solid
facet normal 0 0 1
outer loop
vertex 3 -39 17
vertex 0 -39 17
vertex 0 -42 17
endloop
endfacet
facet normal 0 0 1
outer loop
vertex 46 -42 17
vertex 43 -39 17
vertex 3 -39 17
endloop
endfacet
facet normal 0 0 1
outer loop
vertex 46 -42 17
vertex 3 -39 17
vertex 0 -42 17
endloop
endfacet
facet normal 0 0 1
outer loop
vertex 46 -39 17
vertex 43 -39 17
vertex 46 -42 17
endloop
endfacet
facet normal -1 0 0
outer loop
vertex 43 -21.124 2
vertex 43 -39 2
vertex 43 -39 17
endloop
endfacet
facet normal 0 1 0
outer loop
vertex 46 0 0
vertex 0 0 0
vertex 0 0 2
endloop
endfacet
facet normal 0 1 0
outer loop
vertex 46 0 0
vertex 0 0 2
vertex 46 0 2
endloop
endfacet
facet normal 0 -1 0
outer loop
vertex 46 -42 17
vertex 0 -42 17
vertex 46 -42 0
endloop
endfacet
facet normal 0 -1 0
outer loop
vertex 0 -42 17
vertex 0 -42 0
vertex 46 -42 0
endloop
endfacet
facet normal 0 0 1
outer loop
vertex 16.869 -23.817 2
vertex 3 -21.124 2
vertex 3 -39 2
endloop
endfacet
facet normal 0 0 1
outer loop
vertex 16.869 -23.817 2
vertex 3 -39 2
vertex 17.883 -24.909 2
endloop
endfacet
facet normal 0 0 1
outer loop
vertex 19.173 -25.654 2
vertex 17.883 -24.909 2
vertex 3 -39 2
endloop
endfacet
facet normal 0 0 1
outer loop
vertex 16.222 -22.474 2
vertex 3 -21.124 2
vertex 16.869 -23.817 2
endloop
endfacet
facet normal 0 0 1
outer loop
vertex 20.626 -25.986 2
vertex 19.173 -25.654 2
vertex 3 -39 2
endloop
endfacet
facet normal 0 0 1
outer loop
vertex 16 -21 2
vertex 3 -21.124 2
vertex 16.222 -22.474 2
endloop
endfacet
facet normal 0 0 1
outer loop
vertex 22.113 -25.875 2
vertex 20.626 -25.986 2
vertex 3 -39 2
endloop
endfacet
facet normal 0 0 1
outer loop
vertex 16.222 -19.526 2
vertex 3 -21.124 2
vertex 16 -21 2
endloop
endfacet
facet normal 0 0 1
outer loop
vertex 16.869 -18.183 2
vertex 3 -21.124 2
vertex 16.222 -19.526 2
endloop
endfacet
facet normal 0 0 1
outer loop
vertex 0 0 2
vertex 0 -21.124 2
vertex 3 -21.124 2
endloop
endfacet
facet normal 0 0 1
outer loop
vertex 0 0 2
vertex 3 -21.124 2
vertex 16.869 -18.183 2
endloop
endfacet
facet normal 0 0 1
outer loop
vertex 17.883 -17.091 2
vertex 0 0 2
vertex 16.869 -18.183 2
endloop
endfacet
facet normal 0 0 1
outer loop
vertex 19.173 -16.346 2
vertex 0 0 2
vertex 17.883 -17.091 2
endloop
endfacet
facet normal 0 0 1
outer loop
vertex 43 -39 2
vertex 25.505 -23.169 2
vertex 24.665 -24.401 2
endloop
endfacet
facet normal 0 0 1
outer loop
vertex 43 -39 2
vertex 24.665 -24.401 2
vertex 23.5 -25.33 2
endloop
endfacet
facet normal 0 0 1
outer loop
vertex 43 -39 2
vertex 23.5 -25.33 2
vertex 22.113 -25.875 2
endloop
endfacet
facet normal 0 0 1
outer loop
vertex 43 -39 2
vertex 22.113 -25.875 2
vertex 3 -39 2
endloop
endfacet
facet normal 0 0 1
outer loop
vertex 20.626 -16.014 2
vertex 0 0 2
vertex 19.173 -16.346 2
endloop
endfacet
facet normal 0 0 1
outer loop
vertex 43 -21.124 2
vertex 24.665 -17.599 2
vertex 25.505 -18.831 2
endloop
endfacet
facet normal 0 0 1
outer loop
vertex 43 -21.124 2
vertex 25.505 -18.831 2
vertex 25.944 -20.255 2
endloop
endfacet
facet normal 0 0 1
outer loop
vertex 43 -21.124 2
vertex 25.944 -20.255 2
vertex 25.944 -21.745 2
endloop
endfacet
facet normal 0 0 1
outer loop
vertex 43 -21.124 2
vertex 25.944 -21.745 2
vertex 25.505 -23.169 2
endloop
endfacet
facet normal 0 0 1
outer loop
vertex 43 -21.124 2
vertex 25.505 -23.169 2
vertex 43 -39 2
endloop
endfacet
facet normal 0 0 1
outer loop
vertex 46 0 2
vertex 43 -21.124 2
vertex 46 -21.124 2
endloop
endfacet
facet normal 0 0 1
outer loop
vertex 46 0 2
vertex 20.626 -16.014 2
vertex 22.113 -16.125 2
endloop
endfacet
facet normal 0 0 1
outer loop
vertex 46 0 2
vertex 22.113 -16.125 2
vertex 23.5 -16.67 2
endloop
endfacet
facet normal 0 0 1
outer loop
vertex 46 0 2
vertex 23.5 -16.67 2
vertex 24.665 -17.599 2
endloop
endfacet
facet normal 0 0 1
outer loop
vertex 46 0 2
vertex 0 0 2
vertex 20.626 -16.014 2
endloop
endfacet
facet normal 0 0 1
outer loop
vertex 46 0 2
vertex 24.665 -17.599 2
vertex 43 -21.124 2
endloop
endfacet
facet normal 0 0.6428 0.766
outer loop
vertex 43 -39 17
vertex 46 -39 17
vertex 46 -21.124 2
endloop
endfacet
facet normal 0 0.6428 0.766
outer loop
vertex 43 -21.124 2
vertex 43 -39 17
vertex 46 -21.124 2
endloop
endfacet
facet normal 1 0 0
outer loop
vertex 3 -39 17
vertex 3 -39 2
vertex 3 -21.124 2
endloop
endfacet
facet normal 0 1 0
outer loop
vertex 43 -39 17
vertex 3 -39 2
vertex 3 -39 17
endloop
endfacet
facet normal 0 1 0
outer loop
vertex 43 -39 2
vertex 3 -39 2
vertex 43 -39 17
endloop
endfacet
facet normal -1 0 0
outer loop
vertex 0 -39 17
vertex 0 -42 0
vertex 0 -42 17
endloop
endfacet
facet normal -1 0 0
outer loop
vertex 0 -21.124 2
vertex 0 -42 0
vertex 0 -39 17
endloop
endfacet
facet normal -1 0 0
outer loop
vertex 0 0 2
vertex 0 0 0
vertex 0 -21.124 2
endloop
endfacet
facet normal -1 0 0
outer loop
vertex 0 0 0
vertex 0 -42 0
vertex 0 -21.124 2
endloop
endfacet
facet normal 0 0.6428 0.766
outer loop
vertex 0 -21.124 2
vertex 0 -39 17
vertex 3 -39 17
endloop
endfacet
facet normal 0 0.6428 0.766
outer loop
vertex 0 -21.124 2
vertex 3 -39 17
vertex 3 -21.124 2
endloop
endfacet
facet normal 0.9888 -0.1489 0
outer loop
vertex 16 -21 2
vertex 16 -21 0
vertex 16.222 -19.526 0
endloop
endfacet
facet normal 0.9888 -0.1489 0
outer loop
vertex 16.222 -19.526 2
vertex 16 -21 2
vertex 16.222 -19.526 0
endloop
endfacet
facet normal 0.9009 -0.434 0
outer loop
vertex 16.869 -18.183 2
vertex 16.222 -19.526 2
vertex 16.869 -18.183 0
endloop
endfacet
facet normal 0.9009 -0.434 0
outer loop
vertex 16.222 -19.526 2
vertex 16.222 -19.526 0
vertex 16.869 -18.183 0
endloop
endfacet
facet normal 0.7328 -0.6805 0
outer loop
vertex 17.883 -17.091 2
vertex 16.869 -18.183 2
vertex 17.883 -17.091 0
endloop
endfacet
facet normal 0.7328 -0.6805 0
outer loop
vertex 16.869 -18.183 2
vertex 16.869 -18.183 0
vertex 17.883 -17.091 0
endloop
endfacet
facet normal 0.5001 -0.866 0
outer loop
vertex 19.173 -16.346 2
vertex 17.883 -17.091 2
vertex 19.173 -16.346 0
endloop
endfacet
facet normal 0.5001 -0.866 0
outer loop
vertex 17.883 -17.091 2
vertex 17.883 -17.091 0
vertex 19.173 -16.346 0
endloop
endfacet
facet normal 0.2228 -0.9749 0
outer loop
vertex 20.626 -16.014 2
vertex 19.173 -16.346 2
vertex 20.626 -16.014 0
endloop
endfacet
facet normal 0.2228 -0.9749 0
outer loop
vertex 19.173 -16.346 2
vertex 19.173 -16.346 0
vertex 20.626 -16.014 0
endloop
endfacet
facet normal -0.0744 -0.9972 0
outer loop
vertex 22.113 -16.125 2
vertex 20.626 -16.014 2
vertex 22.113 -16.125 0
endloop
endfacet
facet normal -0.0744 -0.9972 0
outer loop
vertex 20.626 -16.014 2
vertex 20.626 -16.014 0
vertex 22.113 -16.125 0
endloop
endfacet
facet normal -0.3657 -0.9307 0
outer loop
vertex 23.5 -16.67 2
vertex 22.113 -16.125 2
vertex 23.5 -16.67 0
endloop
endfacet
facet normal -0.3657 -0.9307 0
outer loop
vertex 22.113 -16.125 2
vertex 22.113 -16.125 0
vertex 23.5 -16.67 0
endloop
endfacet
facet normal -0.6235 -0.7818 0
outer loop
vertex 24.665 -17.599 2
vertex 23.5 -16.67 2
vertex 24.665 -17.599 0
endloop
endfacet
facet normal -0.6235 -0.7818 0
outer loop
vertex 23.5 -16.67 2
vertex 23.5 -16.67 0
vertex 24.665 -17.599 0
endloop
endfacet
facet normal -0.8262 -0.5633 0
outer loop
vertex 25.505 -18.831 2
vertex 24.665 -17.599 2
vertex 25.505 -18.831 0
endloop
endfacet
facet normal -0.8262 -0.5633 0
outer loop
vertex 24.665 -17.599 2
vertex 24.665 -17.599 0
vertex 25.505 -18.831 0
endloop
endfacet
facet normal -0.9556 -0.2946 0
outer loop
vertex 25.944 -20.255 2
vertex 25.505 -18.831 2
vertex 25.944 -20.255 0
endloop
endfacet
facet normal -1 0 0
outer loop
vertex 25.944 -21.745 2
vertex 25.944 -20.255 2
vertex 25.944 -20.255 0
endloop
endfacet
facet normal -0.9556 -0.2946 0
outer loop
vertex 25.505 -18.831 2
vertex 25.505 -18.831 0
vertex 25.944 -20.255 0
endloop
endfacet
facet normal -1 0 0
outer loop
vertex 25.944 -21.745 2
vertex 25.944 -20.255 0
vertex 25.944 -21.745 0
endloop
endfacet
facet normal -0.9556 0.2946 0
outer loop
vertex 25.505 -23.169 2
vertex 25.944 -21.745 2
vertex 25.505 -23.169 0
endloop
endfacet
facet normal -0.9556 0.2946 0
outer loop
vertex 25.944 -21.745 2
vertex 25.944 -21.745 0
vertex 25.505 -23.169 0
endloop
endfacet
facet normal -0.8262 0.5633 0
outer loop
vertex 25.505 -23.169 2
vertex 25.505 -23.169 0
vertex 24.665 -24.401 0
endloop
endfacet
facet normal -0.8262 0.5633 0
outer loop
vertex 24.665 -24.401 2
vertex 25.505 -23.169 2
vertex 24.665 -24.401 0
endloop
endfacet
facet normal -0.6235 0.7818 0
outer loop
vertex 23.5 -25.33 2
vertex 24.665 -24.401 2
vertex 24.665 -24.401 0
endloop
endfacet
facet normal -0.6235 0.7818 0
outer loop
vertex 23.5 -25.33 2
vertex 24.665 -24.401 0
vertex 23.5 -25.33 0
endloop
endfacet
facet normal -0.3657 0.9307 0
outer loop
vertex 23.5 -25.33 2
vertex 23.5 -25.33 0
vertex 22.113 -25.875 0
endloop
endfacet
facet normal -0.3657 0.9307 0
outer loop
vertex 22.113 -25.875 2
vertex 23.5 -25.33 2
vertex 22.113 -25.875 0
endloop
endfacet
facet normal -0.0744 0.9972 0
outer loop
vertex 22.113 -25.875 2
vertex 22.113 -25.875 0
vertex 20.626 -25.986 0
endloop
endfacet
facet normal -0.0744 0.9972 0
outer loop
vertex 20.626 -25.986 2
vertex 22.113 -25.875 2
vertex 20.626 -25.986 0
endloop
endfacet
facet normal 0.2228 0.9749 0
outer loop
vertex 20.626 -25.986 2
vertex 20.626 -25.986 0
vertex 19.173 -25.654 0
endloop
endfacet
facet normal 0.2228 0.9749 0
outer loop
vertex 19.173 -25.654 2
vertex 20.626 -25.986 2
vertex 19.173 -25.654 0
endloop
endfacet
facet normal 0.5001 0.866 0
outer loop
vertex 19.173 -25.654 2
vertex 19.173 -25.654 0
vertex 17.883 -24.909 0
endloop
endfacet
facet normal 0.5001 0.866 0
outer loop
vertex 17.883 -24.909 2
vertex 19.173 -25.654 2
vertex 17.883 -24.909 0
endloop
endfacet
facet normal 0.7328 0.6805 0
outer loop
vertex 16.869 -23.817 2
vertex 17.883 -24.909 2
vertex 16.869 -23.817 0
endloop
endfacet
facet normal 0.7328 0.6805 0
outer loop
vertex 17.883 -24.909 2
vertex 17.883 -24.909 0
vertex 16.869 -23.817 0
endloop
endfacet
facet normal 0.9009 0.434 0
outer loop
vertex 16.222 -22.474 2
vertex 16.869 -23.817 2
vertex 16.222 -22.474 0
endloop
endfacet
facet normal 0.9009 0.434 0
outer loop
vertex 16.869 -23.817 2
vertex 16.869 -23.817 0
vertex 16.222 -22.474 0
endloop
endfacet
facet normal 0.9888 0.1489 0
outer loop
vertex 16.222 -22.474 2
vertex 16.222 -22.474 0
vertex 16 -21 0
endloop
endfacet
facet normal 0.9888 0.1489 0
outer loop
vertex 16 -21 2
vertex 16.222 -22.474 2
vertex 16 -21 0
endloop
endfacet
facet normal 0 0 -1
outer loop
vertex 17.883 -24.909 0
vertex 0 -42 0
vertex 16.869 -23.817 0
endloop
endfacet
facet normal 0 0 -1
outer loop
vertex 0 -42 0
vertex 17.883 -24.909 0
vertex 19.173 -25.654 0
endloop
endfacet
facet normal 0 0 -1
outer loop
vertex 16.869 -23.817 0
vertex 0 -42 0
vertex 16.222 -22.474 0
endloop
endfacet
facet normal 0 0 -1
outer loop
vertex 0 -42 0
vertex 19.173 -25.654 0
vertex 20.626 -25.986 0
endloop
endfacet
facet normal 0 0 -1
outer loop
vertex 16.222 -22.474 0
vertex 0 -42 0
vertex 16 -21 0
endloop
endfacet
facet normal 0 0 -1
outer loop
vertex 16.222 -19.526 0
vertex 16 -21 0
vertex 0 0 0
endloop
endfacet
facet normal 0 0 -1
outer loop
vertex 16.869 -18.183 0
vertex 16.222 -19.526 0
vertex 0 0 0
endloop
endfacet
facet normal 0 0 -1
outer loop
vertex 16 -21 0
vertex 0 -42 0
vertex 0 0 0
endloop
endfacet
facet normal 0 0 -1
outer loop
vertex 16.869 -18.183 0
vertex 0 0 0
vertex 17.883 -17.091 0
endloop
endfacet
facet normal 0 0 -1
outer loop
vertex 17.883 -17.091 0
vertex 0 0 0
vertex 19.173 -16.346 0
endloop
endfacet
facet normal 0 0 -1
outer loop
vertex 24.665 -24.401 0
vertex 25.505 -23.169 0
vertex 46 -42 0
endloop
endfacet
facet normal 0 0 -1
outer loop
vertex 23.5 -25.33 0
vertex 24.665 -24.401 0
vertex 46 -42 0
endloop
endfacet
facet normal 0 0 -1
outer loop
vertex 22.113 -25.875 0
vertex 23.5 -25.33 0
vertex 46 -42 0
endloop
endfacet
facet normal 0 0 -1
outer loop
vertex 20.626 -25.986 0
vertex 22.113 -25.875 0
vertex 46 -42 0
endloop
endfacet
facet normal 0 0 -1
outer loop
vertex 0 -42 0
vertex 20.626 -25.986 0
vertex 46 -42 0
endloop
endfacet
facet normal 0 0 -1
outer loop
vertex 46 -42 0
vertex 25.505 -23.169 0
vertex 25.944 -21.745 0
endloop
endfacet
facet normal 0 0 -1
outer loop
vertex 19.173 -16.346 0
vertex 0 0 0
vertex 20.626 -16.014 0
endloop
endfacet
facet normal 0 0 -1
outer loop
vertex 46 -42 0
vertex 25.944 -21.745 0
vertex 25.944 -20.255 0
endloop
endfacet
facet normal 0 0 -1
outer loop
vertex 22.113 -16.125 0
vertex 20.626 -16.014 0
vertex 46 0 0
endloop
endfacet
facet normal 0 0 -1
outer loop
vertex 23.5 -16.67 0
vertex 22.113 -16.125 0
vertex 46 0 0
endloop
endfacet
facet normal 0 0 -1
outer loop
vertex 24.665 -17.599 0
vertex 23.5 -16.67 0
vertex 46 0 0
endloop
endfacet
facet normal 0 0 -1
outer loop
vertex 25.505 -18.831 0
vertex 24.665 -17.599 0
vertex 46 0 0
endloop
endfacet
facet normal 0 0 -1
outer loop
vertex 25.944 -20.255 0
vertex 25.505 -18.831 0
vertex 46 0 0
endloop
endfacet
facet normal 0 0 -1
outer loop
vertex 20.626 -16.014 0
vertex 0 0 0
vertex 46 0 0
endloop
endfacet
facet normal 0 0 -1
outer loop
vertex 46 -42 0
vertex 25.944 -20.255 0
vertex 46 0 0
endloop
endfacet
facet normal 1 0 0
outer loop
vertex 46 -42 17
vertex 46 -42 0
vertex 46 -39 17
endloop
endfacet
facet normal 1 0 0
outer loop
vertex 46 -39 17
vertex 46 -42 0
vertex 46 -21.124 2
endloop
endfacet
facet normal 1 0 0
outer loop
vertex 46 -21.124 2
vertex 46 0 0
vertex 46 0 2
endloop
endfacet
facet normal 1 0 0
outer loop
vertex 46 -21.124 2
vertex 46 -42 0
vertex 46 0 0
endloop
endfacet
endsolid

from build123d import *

# Parameters (mm, degrees)
SKETCH1_W           = 46
SKETCH1_H           = 42
BOSS_EXTRUDE1_DEPTH = 2
SKETCH2_W           = 46
SKETCH2_H           = 3
BOSS_EXTRUDE2_DEPTH = 15
SKETCH4_R           = 5
CUT_EXTRUDE2_DEPTH  = 2
BOSS_EXTRUDE3_DEPTH = 3
BOSS_EXTRUDE4_DEPTH = 3


with BuildPart() as part:
    # Sketch1 → Boss-Extrude1 (new body)
    with BuildSketch(Plane.XY):
        with Locations((23, -21)):
            Rectangle(SKETCH1_W, SKETCH1_H)
    extrude(amount=BOSS_EXTRUDE1_DEPTH)

    # Sketch2 → Boss-Extrude2 (add)
    with BuildSketch(Plane.XY.offset(2)):
        with Locations((23, -40.5)):
            Rectangle(SKETCH2_W, SKETCH2_H)
    extrude(amount=BOSS_EXTRUDE2_DEPTH)

    # Sketch4 → Cut-Extrude2 (cut)
    with BuildSketch(Plane(origin=(0, 0, 0), x_dir=(-1, 0, 0), z_dir=(0, 0, -1))):
        with Locations((-21, -21)):
            Circle(SKETCH4_R)
    extrude(amount=-CUT_EXTRUDE2_DEPTH, mode=Mode.SUBTRACT)

    # Sketch5 → Boss-Extrude3 (add)
    with BuildSketch(Plane.ZY):
        Polygon((17, -39), (2, -21.123696111), (2, -39), align=None)
    extrude(amount=-BOSS_EXTRUDE3_DEPTH)

    # Sketch6 → Boss-Extrude4 (add)
    with BuildSketch(Plane(origin=(46, 0, 0), x_dir=(0, 0, -1), z_dir=(1, 0, 0))):
        Polygon((-17, -39), (-2, -21.123696111), (-2, -39), align=None)
    extrude(amount=-BOSS_EXTRUDE4_DEPTH)


solid = part.part
